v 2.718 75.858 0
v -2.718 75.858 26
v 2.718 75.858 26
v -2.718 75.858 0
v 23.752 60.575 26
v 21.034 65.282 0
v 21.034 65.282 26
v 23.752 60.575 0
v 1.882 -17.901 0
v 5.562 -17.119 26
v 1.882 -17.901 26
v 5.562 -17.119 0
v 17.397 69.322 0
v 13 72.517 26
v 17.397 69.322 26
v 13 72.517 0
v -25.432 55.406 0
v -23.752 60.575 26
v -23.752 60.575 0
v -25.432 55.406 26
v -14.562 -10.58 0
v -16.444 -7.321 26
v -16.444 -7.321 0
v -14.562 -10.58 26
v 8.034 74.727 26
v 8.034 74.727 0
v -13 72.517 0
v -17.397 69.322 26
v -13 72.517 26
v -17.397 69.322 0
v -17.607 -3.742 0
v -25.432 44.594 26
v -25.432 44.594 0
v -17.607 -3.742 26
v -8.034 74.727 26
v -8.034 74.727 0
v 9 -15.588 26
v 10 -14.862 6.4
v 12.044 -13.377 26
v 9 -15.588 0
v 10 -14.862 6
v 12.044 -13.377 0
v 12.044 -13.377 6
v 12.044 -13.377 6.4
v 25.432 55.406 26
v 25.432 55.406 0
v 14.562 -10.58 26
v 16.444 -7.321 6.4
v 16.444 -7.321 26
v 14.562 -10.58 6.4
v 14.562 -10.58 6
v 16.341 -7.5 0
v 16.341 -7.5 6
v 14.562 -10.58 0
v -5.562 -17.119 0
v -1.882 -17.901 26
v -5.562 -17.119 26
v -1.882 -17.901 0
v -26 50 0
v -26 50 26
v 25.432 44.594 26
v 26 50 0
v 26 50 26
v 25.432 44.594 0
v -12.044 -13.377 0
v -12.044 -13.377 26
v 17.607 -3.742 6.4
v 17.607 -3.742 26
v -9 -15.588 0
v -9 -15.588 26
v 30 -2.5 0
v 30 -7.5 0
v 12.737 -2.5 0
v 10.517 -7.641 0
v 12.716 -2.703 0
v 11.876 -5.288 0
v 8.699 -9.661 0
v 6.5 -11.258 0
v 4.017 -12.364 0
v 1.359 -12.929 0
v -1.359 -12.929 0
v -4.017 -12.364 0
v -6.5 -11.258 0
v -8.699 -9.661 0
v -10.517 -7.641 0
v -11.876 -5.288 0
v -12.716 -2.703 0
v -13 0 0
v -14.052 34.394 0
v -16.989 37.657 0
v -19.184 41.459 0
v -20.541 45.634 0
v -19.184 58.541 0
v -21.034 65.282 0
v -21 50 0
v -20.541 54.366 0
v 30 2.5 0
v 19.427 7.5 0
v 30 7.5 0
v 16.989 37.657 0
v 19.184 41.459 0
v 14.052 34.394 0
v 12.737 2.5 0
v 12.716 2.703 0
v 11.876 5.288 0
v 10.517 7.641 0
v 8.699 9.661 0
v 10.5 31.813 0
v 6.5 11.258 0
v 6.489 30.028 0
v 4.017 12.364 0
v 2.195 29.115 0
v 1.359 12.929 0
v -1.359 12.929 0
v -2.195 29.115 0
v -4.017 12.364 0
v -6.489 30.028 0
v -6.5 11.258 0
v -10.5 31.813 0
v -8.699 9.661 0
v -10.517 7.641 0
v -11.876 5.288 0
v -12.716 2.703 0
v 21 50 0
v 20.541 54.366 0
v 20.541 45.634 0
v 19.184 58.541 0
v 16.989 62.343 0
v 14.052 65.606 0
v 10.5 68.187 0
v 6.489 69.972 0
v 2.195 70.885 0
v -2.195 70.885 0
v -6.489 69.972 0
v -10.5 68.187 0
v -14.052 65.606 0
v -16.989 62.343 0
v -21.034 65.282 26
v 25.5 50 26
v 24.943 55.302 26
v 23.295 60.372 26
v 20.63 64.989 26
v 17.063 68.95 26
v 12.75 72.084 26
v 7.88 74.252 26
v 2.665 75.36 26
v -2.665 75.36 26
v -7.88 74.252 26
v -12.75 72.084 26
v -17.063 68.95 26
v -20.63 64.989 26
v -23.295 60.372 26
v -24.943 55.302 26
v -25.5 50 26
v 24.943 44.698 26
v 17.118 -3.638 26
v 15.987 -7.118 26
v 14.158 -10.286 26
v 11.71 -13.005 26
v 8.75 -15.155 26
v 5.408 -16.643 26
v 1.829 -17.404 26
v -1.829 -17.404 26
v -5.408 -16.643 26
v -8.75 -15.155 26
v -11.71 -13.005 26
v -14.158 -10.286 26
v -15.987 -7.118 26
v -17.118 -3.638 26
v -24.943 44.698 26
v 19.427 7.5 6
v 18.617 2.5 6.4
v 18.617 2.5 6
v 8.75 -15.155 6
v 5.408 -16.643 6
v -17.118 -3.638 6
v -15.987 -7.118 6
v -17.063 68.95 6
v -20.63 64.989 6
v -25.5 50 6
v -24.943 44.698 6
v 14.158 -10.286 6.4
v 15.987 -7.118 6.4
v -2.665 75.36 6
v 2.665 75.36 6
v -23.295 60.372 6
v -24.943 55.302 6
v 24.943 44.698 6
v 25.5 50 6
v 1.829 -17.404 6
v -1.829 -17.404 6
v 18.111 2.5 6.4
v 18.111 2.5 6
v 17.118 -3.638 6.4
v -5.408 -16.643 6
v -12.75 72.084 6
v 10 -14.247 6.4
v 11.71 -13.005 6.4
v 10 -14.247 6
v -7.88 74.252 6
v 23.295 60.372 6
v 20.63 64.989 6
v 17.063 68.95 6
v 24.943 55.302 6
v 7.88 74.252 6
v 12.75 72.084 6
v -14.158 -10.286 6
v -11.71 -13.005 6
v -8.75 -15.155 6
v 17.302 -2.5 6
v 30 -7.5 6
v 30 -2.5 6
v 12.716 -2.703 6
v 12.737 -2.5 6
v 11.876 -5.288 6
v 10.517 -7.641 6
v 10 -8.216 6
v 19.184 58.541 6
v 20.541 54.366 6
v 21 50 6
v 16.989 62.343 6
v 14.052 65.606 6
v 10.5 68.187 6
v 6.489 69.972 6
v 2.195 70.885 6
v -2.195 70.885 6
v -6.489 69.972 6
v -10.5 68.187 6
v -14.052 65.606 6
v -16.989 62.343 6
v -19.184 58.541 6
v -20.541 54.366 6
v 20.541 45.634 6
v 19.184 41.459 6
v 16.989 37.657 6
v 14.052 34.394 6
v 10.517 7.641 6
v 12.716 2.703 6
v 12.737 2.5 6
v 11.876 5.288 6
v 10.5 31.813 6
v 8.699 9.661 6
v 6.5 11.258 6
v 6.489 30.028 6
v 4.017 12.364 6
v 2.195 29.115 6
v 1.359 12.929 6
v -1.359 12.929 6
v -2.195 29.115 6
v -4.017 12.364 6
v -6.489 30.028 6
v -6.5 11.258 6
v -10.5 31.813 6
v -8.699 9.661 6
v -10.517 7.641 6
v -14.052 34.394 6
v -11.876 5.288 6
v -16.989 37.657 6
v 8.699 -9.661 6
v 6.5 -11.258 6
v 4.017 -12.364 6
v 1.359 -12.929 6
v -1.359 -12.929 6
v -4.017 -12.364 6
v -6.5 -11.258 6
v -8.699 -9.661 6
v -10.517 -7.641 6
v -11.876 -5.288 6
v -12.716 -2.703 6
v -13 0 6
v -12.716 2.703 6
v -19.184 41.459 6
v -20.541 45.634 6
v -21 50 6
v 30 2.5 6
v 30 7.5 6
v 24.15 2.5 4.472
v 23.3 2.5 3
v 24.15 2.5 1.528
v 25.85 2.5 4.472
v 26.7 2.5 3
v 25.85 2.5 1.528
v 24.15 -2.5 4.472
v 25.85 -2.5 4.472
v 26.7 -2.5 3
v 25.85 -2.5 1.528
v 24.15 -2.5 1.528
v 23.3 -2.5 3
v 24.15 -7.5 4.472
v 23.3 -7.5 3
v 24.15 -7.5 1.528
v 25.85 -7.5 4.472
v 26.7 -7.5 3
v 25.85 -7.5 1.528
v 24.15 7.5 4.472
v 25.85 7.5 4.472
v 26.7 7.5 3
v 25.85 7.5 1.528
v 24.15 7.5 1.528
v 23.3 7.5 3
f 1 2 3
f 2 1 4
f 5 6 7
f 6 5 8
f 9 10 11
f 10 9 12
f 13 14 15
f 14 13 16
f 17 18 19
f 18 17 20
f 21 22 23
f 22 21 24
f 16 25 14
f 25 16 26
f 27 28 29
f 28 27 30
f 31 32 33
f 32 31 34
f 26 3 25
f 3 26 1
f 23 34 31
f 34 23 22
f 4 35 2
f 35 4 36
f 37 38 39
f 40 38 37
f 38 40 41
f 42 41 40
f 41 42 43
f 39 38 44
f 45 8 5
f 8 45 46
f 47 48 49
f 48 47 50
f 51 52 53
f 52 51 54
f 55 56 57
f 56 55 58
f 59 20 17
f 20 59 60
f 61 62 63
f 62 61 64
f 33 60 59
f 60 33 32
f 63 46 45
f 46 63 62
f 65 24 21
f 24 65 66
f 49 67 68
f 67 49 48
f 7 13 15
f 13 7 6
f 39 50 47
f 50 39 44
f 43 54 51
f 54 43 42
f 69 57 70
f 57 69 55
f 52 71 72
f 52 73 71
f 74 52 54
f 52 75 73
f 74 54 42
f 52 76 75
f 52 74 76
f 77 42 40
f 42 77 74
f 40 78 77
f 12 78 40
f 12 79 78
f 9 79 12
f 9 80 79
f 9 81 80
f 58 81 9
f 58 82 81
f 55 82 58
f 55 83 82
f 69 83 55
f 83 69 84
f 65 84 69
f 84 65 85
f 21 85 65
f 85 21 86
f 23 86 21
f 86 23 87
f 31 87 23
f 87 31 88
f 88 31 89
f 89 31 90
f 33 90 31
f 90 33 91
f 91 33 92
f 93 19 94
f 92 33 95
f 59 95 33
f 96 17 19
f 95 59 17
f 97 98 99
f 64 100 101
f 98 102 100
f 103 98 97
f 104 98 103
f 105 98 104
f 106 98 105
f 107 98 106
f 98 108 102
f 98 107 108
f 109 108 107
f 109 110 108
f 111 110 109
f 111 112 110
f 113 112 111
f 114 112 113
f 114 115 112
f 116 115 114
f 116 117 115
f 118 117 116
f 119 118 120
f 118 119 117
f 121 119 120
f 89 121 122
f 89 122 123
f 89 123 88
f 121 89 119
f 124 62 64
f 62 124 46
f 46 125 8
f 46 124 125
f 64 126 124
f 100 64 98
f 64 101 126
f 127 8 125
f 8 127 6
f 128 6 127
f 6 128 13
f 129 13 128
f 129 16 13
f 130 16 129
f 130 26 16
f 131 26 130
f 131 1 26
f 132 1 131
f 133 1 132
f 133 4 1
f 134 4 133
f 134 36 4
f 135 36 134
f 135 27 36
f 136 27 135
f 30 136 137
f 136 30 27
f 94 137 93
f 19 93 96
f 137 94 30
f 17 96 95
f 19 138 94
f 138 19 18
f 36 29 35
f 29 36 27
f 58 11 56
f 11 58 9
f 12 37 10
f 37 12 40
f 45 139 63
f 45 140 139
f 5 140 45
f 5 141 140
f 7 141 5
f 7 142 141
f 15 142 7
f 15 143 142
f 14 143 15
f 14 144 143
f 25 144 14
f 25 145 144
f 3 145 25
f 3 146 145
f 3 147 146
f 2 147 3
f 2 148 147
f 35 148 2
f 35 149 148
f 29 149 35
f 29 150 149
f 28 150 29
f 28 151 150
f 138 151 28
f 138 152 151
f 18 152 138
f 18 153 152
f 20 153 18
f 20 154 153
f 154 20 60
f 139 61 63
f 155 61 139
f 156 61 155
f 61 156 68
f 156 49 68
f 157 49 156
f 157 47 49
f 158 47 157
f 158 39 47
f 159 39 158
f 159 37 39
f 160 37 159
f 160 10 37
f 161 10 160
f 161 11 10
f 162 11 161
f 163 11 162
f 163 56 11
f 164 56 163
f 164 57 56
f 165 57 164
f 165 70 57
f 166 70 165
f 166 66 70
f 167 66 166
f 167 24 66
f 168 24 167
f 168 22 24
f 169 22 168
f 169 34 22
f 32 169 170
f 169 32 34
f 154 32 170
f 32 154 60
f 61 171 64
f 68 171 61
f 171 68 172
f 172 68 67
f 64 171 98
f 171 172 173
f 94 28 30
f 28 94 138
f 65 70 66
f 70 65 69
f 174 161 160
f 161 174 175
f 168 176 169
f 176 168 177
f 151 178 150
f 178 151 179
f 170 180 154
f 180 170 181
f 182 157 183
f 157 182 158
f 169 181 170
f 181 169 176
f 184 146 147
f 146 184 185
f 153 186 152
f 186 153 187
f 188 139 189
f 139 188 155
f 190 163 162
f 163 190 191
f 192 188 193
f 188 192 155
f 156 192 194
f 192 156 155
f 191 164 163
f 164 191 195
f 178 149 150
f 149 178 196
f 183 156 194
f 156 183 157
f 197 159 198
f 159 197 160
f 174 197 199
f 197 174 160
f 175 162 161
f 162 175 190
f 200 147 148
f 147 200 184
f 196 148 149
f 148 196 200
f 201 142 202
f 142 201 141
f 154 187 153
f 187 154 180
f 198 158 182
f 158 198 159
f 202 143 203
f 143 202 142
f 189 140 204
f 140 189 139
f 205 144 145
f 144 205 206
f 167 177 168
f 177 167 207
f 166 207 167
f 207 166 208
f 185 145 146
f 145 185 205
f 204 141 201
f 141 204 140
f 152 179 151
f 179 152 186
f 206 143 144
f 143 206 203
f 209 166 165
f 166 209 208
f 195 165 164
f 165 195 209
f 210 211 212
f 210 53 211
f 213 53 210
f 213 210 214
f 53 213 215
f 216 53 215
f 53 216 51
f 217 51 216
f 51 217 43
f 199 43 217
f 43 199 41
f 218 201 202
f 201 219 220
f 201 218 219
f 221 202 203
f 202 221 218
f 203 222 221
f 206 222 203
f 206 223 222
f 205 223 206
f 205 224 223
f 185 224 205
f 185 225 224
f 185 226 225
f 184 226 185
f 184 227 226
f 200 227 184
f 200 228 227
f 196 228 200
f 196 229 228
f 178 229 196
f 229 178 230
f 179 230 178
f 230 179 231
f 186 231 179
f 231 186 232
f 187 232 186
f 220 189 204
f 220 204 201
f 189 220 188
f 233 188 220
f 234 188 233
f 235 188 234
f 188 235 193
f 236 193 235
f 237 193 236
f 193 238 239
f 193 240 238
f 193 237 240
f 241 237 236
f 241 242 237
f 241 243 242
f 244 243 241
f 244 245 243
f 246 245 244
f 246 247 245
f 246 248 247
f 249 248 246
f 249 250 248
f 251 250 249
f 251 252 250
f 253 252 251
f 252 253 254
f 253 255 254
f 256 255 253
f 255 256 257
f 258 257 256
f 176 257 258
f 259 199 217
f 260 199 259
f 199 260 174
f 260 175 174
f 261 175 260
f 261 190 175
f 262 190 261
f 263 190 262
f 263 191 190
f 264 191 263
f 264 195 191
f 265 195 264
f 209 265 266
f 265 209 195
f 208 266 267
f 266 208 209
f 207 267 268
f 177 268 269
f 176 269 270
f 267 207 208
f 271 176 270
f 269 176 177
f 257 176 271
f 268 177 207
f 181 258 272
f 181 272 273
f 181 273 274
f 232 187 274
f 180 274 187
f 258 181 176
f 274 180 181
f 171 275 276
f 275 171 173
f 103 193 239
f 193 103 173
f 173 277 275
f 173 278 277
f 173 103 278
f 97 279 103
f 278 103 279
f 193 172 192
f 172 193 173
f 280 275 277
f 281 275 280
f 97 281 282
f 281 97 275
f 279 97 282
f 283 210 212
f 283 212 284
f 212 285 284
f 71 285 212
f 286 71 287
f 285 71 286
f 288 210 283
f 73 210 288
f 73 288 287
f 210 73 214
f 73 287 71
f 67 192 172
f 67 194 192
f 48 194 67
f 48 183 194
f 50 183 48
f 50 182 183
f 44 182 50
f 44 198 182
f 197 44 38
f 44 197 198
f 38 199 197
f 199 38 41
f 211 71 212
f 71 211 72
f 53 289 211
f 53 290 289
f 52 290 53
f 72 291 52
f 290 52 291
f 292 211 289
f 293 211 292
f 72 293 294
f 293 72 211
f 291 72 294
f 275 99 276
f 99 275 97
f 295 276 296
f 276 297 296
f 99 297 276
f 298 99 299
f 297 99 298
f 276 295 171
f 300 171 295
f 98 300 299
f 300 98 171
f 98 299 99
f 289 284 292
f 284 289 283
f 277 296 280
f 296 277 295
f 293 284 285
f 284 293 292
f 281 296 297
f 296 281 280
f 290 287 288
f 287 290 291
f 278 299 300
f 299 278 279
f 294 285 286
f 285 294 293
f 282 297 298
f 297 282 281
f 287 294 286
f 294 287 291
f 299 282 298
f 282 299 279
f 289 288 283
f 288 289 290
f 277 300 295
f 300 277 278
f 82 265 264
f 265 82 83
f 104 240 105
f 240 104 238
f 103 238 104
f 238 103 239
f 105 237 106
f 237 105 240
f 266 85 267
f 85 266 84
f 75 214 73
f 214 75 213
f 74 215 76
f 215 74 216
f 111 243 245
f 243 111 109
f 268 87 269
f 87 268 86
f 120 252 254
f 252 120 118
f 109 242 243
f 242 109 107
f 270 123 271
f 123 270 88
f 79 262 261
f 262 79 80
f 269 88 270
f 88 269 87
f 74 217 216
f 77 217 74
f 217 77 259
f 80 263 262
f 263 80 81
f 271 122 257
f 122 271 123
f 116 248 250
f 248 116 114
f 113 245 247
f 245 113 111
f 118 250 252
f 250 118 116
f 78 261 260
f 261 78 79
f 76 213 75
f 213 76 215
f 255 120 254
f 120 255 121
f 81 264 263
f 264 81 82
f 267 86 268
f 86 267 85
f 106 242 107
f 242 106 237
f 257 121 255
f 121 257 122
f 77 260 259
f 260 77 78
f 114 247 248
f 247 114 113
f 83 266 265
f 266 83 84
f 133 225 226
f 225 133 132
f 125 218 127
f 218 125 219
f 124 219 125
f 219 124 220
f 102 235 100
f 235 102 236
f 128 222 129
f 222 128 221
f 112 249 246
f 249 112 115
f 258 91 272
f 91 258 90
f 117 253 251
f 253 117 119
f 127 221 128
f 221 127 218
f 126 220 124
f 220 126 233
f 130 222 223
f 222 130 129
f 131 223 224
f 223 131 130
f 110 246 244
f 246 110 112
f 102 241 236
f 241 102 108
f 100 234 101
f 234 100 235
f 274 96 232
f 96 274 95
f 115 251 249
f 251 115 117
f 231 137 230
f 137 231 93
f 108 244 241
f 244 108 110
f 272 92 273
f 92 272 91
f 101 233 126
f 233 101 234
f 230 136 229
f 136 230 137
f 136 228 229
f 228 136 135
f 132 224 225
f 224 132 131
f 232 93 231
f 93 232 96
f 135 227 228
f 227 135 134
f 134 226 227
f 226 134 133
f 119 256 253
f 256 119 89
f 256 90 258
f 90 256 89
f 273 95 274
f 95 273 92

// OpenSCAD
// Dust Shoe

spindleCollarD 	= 26;
spindleCollarH	= 6 ;
curtainDepth	= 26 ; 
ringThickness	= 5 ; 
vacHoleD		= 42 ;	 
holeDist		= 50 ;
m3HoleD			= 3.4 ; 


difference(){
	curtain();
	fixtureCutout();
}

difference (){
	Top();
	holes();
	fixtureCutout();
}

module Top(){
	hull(){
		cylinder(r = spindleCollarD / 2 + ringThickness, h = spindleCollarH);
		translate ([0, holeDist, 0])	
			cylinder (r = vacHoleD / 2 + ringThickness, h = spindleCollarH);
	}
	lugs();
}

module holes(){
	translate ([0,0, -.2]){
		cylinder(r = spindleCollarD / 2, h = spindleCollarH + .4);
		translate ([0, holeDist, 0])	
			cylinder (r = vacHoleD / 2, h = spindleCollarH + .4);
			}
}

module curtain(){
	difference(){
		hull(){
			cylinder(r = spindleCollarD / 2 + ringThickness, h = curtainDepth);
			translate ([0, holeDist, 0])	
				cylinder (r = vacHoleD / 2 + ringThickness, h = curtainDepth);
		}
		hull(){
			cylinder(r = spindleCollarD / 2 + ringThickness - .5, h = curtainDepth + .1);
			translate ([0, holeDist, 0])	
				cylinder (r = vacHoleD / 2 + ringThickness - .5, h = curtainDepth + .1);
		}	
	}
}

module lugs(){
	difference(){
		translate ([0, -(ringThickness + 2.5), 0]){
			cube([30, ringThickness, spindleCollarH]);
			translate([0, ringThickness + 5, 0])
				cube([30, ringThickness, spindleCollarH]);
		}
	translate([30 - 5 ,10,spindleCollarH /2 ])
		rotate ([90,0,0])
			cylinder(r= m3HoleD/2 , h = 30);
	}
}

module fixtureCutout(){
	translate([0,-2.5, 0]){
		cube([30, 5, spindleCollarH]);
	}
	translate([10,-117.5,spindleCollarH]){
		cube([120, 120, .4]);
	}
}
